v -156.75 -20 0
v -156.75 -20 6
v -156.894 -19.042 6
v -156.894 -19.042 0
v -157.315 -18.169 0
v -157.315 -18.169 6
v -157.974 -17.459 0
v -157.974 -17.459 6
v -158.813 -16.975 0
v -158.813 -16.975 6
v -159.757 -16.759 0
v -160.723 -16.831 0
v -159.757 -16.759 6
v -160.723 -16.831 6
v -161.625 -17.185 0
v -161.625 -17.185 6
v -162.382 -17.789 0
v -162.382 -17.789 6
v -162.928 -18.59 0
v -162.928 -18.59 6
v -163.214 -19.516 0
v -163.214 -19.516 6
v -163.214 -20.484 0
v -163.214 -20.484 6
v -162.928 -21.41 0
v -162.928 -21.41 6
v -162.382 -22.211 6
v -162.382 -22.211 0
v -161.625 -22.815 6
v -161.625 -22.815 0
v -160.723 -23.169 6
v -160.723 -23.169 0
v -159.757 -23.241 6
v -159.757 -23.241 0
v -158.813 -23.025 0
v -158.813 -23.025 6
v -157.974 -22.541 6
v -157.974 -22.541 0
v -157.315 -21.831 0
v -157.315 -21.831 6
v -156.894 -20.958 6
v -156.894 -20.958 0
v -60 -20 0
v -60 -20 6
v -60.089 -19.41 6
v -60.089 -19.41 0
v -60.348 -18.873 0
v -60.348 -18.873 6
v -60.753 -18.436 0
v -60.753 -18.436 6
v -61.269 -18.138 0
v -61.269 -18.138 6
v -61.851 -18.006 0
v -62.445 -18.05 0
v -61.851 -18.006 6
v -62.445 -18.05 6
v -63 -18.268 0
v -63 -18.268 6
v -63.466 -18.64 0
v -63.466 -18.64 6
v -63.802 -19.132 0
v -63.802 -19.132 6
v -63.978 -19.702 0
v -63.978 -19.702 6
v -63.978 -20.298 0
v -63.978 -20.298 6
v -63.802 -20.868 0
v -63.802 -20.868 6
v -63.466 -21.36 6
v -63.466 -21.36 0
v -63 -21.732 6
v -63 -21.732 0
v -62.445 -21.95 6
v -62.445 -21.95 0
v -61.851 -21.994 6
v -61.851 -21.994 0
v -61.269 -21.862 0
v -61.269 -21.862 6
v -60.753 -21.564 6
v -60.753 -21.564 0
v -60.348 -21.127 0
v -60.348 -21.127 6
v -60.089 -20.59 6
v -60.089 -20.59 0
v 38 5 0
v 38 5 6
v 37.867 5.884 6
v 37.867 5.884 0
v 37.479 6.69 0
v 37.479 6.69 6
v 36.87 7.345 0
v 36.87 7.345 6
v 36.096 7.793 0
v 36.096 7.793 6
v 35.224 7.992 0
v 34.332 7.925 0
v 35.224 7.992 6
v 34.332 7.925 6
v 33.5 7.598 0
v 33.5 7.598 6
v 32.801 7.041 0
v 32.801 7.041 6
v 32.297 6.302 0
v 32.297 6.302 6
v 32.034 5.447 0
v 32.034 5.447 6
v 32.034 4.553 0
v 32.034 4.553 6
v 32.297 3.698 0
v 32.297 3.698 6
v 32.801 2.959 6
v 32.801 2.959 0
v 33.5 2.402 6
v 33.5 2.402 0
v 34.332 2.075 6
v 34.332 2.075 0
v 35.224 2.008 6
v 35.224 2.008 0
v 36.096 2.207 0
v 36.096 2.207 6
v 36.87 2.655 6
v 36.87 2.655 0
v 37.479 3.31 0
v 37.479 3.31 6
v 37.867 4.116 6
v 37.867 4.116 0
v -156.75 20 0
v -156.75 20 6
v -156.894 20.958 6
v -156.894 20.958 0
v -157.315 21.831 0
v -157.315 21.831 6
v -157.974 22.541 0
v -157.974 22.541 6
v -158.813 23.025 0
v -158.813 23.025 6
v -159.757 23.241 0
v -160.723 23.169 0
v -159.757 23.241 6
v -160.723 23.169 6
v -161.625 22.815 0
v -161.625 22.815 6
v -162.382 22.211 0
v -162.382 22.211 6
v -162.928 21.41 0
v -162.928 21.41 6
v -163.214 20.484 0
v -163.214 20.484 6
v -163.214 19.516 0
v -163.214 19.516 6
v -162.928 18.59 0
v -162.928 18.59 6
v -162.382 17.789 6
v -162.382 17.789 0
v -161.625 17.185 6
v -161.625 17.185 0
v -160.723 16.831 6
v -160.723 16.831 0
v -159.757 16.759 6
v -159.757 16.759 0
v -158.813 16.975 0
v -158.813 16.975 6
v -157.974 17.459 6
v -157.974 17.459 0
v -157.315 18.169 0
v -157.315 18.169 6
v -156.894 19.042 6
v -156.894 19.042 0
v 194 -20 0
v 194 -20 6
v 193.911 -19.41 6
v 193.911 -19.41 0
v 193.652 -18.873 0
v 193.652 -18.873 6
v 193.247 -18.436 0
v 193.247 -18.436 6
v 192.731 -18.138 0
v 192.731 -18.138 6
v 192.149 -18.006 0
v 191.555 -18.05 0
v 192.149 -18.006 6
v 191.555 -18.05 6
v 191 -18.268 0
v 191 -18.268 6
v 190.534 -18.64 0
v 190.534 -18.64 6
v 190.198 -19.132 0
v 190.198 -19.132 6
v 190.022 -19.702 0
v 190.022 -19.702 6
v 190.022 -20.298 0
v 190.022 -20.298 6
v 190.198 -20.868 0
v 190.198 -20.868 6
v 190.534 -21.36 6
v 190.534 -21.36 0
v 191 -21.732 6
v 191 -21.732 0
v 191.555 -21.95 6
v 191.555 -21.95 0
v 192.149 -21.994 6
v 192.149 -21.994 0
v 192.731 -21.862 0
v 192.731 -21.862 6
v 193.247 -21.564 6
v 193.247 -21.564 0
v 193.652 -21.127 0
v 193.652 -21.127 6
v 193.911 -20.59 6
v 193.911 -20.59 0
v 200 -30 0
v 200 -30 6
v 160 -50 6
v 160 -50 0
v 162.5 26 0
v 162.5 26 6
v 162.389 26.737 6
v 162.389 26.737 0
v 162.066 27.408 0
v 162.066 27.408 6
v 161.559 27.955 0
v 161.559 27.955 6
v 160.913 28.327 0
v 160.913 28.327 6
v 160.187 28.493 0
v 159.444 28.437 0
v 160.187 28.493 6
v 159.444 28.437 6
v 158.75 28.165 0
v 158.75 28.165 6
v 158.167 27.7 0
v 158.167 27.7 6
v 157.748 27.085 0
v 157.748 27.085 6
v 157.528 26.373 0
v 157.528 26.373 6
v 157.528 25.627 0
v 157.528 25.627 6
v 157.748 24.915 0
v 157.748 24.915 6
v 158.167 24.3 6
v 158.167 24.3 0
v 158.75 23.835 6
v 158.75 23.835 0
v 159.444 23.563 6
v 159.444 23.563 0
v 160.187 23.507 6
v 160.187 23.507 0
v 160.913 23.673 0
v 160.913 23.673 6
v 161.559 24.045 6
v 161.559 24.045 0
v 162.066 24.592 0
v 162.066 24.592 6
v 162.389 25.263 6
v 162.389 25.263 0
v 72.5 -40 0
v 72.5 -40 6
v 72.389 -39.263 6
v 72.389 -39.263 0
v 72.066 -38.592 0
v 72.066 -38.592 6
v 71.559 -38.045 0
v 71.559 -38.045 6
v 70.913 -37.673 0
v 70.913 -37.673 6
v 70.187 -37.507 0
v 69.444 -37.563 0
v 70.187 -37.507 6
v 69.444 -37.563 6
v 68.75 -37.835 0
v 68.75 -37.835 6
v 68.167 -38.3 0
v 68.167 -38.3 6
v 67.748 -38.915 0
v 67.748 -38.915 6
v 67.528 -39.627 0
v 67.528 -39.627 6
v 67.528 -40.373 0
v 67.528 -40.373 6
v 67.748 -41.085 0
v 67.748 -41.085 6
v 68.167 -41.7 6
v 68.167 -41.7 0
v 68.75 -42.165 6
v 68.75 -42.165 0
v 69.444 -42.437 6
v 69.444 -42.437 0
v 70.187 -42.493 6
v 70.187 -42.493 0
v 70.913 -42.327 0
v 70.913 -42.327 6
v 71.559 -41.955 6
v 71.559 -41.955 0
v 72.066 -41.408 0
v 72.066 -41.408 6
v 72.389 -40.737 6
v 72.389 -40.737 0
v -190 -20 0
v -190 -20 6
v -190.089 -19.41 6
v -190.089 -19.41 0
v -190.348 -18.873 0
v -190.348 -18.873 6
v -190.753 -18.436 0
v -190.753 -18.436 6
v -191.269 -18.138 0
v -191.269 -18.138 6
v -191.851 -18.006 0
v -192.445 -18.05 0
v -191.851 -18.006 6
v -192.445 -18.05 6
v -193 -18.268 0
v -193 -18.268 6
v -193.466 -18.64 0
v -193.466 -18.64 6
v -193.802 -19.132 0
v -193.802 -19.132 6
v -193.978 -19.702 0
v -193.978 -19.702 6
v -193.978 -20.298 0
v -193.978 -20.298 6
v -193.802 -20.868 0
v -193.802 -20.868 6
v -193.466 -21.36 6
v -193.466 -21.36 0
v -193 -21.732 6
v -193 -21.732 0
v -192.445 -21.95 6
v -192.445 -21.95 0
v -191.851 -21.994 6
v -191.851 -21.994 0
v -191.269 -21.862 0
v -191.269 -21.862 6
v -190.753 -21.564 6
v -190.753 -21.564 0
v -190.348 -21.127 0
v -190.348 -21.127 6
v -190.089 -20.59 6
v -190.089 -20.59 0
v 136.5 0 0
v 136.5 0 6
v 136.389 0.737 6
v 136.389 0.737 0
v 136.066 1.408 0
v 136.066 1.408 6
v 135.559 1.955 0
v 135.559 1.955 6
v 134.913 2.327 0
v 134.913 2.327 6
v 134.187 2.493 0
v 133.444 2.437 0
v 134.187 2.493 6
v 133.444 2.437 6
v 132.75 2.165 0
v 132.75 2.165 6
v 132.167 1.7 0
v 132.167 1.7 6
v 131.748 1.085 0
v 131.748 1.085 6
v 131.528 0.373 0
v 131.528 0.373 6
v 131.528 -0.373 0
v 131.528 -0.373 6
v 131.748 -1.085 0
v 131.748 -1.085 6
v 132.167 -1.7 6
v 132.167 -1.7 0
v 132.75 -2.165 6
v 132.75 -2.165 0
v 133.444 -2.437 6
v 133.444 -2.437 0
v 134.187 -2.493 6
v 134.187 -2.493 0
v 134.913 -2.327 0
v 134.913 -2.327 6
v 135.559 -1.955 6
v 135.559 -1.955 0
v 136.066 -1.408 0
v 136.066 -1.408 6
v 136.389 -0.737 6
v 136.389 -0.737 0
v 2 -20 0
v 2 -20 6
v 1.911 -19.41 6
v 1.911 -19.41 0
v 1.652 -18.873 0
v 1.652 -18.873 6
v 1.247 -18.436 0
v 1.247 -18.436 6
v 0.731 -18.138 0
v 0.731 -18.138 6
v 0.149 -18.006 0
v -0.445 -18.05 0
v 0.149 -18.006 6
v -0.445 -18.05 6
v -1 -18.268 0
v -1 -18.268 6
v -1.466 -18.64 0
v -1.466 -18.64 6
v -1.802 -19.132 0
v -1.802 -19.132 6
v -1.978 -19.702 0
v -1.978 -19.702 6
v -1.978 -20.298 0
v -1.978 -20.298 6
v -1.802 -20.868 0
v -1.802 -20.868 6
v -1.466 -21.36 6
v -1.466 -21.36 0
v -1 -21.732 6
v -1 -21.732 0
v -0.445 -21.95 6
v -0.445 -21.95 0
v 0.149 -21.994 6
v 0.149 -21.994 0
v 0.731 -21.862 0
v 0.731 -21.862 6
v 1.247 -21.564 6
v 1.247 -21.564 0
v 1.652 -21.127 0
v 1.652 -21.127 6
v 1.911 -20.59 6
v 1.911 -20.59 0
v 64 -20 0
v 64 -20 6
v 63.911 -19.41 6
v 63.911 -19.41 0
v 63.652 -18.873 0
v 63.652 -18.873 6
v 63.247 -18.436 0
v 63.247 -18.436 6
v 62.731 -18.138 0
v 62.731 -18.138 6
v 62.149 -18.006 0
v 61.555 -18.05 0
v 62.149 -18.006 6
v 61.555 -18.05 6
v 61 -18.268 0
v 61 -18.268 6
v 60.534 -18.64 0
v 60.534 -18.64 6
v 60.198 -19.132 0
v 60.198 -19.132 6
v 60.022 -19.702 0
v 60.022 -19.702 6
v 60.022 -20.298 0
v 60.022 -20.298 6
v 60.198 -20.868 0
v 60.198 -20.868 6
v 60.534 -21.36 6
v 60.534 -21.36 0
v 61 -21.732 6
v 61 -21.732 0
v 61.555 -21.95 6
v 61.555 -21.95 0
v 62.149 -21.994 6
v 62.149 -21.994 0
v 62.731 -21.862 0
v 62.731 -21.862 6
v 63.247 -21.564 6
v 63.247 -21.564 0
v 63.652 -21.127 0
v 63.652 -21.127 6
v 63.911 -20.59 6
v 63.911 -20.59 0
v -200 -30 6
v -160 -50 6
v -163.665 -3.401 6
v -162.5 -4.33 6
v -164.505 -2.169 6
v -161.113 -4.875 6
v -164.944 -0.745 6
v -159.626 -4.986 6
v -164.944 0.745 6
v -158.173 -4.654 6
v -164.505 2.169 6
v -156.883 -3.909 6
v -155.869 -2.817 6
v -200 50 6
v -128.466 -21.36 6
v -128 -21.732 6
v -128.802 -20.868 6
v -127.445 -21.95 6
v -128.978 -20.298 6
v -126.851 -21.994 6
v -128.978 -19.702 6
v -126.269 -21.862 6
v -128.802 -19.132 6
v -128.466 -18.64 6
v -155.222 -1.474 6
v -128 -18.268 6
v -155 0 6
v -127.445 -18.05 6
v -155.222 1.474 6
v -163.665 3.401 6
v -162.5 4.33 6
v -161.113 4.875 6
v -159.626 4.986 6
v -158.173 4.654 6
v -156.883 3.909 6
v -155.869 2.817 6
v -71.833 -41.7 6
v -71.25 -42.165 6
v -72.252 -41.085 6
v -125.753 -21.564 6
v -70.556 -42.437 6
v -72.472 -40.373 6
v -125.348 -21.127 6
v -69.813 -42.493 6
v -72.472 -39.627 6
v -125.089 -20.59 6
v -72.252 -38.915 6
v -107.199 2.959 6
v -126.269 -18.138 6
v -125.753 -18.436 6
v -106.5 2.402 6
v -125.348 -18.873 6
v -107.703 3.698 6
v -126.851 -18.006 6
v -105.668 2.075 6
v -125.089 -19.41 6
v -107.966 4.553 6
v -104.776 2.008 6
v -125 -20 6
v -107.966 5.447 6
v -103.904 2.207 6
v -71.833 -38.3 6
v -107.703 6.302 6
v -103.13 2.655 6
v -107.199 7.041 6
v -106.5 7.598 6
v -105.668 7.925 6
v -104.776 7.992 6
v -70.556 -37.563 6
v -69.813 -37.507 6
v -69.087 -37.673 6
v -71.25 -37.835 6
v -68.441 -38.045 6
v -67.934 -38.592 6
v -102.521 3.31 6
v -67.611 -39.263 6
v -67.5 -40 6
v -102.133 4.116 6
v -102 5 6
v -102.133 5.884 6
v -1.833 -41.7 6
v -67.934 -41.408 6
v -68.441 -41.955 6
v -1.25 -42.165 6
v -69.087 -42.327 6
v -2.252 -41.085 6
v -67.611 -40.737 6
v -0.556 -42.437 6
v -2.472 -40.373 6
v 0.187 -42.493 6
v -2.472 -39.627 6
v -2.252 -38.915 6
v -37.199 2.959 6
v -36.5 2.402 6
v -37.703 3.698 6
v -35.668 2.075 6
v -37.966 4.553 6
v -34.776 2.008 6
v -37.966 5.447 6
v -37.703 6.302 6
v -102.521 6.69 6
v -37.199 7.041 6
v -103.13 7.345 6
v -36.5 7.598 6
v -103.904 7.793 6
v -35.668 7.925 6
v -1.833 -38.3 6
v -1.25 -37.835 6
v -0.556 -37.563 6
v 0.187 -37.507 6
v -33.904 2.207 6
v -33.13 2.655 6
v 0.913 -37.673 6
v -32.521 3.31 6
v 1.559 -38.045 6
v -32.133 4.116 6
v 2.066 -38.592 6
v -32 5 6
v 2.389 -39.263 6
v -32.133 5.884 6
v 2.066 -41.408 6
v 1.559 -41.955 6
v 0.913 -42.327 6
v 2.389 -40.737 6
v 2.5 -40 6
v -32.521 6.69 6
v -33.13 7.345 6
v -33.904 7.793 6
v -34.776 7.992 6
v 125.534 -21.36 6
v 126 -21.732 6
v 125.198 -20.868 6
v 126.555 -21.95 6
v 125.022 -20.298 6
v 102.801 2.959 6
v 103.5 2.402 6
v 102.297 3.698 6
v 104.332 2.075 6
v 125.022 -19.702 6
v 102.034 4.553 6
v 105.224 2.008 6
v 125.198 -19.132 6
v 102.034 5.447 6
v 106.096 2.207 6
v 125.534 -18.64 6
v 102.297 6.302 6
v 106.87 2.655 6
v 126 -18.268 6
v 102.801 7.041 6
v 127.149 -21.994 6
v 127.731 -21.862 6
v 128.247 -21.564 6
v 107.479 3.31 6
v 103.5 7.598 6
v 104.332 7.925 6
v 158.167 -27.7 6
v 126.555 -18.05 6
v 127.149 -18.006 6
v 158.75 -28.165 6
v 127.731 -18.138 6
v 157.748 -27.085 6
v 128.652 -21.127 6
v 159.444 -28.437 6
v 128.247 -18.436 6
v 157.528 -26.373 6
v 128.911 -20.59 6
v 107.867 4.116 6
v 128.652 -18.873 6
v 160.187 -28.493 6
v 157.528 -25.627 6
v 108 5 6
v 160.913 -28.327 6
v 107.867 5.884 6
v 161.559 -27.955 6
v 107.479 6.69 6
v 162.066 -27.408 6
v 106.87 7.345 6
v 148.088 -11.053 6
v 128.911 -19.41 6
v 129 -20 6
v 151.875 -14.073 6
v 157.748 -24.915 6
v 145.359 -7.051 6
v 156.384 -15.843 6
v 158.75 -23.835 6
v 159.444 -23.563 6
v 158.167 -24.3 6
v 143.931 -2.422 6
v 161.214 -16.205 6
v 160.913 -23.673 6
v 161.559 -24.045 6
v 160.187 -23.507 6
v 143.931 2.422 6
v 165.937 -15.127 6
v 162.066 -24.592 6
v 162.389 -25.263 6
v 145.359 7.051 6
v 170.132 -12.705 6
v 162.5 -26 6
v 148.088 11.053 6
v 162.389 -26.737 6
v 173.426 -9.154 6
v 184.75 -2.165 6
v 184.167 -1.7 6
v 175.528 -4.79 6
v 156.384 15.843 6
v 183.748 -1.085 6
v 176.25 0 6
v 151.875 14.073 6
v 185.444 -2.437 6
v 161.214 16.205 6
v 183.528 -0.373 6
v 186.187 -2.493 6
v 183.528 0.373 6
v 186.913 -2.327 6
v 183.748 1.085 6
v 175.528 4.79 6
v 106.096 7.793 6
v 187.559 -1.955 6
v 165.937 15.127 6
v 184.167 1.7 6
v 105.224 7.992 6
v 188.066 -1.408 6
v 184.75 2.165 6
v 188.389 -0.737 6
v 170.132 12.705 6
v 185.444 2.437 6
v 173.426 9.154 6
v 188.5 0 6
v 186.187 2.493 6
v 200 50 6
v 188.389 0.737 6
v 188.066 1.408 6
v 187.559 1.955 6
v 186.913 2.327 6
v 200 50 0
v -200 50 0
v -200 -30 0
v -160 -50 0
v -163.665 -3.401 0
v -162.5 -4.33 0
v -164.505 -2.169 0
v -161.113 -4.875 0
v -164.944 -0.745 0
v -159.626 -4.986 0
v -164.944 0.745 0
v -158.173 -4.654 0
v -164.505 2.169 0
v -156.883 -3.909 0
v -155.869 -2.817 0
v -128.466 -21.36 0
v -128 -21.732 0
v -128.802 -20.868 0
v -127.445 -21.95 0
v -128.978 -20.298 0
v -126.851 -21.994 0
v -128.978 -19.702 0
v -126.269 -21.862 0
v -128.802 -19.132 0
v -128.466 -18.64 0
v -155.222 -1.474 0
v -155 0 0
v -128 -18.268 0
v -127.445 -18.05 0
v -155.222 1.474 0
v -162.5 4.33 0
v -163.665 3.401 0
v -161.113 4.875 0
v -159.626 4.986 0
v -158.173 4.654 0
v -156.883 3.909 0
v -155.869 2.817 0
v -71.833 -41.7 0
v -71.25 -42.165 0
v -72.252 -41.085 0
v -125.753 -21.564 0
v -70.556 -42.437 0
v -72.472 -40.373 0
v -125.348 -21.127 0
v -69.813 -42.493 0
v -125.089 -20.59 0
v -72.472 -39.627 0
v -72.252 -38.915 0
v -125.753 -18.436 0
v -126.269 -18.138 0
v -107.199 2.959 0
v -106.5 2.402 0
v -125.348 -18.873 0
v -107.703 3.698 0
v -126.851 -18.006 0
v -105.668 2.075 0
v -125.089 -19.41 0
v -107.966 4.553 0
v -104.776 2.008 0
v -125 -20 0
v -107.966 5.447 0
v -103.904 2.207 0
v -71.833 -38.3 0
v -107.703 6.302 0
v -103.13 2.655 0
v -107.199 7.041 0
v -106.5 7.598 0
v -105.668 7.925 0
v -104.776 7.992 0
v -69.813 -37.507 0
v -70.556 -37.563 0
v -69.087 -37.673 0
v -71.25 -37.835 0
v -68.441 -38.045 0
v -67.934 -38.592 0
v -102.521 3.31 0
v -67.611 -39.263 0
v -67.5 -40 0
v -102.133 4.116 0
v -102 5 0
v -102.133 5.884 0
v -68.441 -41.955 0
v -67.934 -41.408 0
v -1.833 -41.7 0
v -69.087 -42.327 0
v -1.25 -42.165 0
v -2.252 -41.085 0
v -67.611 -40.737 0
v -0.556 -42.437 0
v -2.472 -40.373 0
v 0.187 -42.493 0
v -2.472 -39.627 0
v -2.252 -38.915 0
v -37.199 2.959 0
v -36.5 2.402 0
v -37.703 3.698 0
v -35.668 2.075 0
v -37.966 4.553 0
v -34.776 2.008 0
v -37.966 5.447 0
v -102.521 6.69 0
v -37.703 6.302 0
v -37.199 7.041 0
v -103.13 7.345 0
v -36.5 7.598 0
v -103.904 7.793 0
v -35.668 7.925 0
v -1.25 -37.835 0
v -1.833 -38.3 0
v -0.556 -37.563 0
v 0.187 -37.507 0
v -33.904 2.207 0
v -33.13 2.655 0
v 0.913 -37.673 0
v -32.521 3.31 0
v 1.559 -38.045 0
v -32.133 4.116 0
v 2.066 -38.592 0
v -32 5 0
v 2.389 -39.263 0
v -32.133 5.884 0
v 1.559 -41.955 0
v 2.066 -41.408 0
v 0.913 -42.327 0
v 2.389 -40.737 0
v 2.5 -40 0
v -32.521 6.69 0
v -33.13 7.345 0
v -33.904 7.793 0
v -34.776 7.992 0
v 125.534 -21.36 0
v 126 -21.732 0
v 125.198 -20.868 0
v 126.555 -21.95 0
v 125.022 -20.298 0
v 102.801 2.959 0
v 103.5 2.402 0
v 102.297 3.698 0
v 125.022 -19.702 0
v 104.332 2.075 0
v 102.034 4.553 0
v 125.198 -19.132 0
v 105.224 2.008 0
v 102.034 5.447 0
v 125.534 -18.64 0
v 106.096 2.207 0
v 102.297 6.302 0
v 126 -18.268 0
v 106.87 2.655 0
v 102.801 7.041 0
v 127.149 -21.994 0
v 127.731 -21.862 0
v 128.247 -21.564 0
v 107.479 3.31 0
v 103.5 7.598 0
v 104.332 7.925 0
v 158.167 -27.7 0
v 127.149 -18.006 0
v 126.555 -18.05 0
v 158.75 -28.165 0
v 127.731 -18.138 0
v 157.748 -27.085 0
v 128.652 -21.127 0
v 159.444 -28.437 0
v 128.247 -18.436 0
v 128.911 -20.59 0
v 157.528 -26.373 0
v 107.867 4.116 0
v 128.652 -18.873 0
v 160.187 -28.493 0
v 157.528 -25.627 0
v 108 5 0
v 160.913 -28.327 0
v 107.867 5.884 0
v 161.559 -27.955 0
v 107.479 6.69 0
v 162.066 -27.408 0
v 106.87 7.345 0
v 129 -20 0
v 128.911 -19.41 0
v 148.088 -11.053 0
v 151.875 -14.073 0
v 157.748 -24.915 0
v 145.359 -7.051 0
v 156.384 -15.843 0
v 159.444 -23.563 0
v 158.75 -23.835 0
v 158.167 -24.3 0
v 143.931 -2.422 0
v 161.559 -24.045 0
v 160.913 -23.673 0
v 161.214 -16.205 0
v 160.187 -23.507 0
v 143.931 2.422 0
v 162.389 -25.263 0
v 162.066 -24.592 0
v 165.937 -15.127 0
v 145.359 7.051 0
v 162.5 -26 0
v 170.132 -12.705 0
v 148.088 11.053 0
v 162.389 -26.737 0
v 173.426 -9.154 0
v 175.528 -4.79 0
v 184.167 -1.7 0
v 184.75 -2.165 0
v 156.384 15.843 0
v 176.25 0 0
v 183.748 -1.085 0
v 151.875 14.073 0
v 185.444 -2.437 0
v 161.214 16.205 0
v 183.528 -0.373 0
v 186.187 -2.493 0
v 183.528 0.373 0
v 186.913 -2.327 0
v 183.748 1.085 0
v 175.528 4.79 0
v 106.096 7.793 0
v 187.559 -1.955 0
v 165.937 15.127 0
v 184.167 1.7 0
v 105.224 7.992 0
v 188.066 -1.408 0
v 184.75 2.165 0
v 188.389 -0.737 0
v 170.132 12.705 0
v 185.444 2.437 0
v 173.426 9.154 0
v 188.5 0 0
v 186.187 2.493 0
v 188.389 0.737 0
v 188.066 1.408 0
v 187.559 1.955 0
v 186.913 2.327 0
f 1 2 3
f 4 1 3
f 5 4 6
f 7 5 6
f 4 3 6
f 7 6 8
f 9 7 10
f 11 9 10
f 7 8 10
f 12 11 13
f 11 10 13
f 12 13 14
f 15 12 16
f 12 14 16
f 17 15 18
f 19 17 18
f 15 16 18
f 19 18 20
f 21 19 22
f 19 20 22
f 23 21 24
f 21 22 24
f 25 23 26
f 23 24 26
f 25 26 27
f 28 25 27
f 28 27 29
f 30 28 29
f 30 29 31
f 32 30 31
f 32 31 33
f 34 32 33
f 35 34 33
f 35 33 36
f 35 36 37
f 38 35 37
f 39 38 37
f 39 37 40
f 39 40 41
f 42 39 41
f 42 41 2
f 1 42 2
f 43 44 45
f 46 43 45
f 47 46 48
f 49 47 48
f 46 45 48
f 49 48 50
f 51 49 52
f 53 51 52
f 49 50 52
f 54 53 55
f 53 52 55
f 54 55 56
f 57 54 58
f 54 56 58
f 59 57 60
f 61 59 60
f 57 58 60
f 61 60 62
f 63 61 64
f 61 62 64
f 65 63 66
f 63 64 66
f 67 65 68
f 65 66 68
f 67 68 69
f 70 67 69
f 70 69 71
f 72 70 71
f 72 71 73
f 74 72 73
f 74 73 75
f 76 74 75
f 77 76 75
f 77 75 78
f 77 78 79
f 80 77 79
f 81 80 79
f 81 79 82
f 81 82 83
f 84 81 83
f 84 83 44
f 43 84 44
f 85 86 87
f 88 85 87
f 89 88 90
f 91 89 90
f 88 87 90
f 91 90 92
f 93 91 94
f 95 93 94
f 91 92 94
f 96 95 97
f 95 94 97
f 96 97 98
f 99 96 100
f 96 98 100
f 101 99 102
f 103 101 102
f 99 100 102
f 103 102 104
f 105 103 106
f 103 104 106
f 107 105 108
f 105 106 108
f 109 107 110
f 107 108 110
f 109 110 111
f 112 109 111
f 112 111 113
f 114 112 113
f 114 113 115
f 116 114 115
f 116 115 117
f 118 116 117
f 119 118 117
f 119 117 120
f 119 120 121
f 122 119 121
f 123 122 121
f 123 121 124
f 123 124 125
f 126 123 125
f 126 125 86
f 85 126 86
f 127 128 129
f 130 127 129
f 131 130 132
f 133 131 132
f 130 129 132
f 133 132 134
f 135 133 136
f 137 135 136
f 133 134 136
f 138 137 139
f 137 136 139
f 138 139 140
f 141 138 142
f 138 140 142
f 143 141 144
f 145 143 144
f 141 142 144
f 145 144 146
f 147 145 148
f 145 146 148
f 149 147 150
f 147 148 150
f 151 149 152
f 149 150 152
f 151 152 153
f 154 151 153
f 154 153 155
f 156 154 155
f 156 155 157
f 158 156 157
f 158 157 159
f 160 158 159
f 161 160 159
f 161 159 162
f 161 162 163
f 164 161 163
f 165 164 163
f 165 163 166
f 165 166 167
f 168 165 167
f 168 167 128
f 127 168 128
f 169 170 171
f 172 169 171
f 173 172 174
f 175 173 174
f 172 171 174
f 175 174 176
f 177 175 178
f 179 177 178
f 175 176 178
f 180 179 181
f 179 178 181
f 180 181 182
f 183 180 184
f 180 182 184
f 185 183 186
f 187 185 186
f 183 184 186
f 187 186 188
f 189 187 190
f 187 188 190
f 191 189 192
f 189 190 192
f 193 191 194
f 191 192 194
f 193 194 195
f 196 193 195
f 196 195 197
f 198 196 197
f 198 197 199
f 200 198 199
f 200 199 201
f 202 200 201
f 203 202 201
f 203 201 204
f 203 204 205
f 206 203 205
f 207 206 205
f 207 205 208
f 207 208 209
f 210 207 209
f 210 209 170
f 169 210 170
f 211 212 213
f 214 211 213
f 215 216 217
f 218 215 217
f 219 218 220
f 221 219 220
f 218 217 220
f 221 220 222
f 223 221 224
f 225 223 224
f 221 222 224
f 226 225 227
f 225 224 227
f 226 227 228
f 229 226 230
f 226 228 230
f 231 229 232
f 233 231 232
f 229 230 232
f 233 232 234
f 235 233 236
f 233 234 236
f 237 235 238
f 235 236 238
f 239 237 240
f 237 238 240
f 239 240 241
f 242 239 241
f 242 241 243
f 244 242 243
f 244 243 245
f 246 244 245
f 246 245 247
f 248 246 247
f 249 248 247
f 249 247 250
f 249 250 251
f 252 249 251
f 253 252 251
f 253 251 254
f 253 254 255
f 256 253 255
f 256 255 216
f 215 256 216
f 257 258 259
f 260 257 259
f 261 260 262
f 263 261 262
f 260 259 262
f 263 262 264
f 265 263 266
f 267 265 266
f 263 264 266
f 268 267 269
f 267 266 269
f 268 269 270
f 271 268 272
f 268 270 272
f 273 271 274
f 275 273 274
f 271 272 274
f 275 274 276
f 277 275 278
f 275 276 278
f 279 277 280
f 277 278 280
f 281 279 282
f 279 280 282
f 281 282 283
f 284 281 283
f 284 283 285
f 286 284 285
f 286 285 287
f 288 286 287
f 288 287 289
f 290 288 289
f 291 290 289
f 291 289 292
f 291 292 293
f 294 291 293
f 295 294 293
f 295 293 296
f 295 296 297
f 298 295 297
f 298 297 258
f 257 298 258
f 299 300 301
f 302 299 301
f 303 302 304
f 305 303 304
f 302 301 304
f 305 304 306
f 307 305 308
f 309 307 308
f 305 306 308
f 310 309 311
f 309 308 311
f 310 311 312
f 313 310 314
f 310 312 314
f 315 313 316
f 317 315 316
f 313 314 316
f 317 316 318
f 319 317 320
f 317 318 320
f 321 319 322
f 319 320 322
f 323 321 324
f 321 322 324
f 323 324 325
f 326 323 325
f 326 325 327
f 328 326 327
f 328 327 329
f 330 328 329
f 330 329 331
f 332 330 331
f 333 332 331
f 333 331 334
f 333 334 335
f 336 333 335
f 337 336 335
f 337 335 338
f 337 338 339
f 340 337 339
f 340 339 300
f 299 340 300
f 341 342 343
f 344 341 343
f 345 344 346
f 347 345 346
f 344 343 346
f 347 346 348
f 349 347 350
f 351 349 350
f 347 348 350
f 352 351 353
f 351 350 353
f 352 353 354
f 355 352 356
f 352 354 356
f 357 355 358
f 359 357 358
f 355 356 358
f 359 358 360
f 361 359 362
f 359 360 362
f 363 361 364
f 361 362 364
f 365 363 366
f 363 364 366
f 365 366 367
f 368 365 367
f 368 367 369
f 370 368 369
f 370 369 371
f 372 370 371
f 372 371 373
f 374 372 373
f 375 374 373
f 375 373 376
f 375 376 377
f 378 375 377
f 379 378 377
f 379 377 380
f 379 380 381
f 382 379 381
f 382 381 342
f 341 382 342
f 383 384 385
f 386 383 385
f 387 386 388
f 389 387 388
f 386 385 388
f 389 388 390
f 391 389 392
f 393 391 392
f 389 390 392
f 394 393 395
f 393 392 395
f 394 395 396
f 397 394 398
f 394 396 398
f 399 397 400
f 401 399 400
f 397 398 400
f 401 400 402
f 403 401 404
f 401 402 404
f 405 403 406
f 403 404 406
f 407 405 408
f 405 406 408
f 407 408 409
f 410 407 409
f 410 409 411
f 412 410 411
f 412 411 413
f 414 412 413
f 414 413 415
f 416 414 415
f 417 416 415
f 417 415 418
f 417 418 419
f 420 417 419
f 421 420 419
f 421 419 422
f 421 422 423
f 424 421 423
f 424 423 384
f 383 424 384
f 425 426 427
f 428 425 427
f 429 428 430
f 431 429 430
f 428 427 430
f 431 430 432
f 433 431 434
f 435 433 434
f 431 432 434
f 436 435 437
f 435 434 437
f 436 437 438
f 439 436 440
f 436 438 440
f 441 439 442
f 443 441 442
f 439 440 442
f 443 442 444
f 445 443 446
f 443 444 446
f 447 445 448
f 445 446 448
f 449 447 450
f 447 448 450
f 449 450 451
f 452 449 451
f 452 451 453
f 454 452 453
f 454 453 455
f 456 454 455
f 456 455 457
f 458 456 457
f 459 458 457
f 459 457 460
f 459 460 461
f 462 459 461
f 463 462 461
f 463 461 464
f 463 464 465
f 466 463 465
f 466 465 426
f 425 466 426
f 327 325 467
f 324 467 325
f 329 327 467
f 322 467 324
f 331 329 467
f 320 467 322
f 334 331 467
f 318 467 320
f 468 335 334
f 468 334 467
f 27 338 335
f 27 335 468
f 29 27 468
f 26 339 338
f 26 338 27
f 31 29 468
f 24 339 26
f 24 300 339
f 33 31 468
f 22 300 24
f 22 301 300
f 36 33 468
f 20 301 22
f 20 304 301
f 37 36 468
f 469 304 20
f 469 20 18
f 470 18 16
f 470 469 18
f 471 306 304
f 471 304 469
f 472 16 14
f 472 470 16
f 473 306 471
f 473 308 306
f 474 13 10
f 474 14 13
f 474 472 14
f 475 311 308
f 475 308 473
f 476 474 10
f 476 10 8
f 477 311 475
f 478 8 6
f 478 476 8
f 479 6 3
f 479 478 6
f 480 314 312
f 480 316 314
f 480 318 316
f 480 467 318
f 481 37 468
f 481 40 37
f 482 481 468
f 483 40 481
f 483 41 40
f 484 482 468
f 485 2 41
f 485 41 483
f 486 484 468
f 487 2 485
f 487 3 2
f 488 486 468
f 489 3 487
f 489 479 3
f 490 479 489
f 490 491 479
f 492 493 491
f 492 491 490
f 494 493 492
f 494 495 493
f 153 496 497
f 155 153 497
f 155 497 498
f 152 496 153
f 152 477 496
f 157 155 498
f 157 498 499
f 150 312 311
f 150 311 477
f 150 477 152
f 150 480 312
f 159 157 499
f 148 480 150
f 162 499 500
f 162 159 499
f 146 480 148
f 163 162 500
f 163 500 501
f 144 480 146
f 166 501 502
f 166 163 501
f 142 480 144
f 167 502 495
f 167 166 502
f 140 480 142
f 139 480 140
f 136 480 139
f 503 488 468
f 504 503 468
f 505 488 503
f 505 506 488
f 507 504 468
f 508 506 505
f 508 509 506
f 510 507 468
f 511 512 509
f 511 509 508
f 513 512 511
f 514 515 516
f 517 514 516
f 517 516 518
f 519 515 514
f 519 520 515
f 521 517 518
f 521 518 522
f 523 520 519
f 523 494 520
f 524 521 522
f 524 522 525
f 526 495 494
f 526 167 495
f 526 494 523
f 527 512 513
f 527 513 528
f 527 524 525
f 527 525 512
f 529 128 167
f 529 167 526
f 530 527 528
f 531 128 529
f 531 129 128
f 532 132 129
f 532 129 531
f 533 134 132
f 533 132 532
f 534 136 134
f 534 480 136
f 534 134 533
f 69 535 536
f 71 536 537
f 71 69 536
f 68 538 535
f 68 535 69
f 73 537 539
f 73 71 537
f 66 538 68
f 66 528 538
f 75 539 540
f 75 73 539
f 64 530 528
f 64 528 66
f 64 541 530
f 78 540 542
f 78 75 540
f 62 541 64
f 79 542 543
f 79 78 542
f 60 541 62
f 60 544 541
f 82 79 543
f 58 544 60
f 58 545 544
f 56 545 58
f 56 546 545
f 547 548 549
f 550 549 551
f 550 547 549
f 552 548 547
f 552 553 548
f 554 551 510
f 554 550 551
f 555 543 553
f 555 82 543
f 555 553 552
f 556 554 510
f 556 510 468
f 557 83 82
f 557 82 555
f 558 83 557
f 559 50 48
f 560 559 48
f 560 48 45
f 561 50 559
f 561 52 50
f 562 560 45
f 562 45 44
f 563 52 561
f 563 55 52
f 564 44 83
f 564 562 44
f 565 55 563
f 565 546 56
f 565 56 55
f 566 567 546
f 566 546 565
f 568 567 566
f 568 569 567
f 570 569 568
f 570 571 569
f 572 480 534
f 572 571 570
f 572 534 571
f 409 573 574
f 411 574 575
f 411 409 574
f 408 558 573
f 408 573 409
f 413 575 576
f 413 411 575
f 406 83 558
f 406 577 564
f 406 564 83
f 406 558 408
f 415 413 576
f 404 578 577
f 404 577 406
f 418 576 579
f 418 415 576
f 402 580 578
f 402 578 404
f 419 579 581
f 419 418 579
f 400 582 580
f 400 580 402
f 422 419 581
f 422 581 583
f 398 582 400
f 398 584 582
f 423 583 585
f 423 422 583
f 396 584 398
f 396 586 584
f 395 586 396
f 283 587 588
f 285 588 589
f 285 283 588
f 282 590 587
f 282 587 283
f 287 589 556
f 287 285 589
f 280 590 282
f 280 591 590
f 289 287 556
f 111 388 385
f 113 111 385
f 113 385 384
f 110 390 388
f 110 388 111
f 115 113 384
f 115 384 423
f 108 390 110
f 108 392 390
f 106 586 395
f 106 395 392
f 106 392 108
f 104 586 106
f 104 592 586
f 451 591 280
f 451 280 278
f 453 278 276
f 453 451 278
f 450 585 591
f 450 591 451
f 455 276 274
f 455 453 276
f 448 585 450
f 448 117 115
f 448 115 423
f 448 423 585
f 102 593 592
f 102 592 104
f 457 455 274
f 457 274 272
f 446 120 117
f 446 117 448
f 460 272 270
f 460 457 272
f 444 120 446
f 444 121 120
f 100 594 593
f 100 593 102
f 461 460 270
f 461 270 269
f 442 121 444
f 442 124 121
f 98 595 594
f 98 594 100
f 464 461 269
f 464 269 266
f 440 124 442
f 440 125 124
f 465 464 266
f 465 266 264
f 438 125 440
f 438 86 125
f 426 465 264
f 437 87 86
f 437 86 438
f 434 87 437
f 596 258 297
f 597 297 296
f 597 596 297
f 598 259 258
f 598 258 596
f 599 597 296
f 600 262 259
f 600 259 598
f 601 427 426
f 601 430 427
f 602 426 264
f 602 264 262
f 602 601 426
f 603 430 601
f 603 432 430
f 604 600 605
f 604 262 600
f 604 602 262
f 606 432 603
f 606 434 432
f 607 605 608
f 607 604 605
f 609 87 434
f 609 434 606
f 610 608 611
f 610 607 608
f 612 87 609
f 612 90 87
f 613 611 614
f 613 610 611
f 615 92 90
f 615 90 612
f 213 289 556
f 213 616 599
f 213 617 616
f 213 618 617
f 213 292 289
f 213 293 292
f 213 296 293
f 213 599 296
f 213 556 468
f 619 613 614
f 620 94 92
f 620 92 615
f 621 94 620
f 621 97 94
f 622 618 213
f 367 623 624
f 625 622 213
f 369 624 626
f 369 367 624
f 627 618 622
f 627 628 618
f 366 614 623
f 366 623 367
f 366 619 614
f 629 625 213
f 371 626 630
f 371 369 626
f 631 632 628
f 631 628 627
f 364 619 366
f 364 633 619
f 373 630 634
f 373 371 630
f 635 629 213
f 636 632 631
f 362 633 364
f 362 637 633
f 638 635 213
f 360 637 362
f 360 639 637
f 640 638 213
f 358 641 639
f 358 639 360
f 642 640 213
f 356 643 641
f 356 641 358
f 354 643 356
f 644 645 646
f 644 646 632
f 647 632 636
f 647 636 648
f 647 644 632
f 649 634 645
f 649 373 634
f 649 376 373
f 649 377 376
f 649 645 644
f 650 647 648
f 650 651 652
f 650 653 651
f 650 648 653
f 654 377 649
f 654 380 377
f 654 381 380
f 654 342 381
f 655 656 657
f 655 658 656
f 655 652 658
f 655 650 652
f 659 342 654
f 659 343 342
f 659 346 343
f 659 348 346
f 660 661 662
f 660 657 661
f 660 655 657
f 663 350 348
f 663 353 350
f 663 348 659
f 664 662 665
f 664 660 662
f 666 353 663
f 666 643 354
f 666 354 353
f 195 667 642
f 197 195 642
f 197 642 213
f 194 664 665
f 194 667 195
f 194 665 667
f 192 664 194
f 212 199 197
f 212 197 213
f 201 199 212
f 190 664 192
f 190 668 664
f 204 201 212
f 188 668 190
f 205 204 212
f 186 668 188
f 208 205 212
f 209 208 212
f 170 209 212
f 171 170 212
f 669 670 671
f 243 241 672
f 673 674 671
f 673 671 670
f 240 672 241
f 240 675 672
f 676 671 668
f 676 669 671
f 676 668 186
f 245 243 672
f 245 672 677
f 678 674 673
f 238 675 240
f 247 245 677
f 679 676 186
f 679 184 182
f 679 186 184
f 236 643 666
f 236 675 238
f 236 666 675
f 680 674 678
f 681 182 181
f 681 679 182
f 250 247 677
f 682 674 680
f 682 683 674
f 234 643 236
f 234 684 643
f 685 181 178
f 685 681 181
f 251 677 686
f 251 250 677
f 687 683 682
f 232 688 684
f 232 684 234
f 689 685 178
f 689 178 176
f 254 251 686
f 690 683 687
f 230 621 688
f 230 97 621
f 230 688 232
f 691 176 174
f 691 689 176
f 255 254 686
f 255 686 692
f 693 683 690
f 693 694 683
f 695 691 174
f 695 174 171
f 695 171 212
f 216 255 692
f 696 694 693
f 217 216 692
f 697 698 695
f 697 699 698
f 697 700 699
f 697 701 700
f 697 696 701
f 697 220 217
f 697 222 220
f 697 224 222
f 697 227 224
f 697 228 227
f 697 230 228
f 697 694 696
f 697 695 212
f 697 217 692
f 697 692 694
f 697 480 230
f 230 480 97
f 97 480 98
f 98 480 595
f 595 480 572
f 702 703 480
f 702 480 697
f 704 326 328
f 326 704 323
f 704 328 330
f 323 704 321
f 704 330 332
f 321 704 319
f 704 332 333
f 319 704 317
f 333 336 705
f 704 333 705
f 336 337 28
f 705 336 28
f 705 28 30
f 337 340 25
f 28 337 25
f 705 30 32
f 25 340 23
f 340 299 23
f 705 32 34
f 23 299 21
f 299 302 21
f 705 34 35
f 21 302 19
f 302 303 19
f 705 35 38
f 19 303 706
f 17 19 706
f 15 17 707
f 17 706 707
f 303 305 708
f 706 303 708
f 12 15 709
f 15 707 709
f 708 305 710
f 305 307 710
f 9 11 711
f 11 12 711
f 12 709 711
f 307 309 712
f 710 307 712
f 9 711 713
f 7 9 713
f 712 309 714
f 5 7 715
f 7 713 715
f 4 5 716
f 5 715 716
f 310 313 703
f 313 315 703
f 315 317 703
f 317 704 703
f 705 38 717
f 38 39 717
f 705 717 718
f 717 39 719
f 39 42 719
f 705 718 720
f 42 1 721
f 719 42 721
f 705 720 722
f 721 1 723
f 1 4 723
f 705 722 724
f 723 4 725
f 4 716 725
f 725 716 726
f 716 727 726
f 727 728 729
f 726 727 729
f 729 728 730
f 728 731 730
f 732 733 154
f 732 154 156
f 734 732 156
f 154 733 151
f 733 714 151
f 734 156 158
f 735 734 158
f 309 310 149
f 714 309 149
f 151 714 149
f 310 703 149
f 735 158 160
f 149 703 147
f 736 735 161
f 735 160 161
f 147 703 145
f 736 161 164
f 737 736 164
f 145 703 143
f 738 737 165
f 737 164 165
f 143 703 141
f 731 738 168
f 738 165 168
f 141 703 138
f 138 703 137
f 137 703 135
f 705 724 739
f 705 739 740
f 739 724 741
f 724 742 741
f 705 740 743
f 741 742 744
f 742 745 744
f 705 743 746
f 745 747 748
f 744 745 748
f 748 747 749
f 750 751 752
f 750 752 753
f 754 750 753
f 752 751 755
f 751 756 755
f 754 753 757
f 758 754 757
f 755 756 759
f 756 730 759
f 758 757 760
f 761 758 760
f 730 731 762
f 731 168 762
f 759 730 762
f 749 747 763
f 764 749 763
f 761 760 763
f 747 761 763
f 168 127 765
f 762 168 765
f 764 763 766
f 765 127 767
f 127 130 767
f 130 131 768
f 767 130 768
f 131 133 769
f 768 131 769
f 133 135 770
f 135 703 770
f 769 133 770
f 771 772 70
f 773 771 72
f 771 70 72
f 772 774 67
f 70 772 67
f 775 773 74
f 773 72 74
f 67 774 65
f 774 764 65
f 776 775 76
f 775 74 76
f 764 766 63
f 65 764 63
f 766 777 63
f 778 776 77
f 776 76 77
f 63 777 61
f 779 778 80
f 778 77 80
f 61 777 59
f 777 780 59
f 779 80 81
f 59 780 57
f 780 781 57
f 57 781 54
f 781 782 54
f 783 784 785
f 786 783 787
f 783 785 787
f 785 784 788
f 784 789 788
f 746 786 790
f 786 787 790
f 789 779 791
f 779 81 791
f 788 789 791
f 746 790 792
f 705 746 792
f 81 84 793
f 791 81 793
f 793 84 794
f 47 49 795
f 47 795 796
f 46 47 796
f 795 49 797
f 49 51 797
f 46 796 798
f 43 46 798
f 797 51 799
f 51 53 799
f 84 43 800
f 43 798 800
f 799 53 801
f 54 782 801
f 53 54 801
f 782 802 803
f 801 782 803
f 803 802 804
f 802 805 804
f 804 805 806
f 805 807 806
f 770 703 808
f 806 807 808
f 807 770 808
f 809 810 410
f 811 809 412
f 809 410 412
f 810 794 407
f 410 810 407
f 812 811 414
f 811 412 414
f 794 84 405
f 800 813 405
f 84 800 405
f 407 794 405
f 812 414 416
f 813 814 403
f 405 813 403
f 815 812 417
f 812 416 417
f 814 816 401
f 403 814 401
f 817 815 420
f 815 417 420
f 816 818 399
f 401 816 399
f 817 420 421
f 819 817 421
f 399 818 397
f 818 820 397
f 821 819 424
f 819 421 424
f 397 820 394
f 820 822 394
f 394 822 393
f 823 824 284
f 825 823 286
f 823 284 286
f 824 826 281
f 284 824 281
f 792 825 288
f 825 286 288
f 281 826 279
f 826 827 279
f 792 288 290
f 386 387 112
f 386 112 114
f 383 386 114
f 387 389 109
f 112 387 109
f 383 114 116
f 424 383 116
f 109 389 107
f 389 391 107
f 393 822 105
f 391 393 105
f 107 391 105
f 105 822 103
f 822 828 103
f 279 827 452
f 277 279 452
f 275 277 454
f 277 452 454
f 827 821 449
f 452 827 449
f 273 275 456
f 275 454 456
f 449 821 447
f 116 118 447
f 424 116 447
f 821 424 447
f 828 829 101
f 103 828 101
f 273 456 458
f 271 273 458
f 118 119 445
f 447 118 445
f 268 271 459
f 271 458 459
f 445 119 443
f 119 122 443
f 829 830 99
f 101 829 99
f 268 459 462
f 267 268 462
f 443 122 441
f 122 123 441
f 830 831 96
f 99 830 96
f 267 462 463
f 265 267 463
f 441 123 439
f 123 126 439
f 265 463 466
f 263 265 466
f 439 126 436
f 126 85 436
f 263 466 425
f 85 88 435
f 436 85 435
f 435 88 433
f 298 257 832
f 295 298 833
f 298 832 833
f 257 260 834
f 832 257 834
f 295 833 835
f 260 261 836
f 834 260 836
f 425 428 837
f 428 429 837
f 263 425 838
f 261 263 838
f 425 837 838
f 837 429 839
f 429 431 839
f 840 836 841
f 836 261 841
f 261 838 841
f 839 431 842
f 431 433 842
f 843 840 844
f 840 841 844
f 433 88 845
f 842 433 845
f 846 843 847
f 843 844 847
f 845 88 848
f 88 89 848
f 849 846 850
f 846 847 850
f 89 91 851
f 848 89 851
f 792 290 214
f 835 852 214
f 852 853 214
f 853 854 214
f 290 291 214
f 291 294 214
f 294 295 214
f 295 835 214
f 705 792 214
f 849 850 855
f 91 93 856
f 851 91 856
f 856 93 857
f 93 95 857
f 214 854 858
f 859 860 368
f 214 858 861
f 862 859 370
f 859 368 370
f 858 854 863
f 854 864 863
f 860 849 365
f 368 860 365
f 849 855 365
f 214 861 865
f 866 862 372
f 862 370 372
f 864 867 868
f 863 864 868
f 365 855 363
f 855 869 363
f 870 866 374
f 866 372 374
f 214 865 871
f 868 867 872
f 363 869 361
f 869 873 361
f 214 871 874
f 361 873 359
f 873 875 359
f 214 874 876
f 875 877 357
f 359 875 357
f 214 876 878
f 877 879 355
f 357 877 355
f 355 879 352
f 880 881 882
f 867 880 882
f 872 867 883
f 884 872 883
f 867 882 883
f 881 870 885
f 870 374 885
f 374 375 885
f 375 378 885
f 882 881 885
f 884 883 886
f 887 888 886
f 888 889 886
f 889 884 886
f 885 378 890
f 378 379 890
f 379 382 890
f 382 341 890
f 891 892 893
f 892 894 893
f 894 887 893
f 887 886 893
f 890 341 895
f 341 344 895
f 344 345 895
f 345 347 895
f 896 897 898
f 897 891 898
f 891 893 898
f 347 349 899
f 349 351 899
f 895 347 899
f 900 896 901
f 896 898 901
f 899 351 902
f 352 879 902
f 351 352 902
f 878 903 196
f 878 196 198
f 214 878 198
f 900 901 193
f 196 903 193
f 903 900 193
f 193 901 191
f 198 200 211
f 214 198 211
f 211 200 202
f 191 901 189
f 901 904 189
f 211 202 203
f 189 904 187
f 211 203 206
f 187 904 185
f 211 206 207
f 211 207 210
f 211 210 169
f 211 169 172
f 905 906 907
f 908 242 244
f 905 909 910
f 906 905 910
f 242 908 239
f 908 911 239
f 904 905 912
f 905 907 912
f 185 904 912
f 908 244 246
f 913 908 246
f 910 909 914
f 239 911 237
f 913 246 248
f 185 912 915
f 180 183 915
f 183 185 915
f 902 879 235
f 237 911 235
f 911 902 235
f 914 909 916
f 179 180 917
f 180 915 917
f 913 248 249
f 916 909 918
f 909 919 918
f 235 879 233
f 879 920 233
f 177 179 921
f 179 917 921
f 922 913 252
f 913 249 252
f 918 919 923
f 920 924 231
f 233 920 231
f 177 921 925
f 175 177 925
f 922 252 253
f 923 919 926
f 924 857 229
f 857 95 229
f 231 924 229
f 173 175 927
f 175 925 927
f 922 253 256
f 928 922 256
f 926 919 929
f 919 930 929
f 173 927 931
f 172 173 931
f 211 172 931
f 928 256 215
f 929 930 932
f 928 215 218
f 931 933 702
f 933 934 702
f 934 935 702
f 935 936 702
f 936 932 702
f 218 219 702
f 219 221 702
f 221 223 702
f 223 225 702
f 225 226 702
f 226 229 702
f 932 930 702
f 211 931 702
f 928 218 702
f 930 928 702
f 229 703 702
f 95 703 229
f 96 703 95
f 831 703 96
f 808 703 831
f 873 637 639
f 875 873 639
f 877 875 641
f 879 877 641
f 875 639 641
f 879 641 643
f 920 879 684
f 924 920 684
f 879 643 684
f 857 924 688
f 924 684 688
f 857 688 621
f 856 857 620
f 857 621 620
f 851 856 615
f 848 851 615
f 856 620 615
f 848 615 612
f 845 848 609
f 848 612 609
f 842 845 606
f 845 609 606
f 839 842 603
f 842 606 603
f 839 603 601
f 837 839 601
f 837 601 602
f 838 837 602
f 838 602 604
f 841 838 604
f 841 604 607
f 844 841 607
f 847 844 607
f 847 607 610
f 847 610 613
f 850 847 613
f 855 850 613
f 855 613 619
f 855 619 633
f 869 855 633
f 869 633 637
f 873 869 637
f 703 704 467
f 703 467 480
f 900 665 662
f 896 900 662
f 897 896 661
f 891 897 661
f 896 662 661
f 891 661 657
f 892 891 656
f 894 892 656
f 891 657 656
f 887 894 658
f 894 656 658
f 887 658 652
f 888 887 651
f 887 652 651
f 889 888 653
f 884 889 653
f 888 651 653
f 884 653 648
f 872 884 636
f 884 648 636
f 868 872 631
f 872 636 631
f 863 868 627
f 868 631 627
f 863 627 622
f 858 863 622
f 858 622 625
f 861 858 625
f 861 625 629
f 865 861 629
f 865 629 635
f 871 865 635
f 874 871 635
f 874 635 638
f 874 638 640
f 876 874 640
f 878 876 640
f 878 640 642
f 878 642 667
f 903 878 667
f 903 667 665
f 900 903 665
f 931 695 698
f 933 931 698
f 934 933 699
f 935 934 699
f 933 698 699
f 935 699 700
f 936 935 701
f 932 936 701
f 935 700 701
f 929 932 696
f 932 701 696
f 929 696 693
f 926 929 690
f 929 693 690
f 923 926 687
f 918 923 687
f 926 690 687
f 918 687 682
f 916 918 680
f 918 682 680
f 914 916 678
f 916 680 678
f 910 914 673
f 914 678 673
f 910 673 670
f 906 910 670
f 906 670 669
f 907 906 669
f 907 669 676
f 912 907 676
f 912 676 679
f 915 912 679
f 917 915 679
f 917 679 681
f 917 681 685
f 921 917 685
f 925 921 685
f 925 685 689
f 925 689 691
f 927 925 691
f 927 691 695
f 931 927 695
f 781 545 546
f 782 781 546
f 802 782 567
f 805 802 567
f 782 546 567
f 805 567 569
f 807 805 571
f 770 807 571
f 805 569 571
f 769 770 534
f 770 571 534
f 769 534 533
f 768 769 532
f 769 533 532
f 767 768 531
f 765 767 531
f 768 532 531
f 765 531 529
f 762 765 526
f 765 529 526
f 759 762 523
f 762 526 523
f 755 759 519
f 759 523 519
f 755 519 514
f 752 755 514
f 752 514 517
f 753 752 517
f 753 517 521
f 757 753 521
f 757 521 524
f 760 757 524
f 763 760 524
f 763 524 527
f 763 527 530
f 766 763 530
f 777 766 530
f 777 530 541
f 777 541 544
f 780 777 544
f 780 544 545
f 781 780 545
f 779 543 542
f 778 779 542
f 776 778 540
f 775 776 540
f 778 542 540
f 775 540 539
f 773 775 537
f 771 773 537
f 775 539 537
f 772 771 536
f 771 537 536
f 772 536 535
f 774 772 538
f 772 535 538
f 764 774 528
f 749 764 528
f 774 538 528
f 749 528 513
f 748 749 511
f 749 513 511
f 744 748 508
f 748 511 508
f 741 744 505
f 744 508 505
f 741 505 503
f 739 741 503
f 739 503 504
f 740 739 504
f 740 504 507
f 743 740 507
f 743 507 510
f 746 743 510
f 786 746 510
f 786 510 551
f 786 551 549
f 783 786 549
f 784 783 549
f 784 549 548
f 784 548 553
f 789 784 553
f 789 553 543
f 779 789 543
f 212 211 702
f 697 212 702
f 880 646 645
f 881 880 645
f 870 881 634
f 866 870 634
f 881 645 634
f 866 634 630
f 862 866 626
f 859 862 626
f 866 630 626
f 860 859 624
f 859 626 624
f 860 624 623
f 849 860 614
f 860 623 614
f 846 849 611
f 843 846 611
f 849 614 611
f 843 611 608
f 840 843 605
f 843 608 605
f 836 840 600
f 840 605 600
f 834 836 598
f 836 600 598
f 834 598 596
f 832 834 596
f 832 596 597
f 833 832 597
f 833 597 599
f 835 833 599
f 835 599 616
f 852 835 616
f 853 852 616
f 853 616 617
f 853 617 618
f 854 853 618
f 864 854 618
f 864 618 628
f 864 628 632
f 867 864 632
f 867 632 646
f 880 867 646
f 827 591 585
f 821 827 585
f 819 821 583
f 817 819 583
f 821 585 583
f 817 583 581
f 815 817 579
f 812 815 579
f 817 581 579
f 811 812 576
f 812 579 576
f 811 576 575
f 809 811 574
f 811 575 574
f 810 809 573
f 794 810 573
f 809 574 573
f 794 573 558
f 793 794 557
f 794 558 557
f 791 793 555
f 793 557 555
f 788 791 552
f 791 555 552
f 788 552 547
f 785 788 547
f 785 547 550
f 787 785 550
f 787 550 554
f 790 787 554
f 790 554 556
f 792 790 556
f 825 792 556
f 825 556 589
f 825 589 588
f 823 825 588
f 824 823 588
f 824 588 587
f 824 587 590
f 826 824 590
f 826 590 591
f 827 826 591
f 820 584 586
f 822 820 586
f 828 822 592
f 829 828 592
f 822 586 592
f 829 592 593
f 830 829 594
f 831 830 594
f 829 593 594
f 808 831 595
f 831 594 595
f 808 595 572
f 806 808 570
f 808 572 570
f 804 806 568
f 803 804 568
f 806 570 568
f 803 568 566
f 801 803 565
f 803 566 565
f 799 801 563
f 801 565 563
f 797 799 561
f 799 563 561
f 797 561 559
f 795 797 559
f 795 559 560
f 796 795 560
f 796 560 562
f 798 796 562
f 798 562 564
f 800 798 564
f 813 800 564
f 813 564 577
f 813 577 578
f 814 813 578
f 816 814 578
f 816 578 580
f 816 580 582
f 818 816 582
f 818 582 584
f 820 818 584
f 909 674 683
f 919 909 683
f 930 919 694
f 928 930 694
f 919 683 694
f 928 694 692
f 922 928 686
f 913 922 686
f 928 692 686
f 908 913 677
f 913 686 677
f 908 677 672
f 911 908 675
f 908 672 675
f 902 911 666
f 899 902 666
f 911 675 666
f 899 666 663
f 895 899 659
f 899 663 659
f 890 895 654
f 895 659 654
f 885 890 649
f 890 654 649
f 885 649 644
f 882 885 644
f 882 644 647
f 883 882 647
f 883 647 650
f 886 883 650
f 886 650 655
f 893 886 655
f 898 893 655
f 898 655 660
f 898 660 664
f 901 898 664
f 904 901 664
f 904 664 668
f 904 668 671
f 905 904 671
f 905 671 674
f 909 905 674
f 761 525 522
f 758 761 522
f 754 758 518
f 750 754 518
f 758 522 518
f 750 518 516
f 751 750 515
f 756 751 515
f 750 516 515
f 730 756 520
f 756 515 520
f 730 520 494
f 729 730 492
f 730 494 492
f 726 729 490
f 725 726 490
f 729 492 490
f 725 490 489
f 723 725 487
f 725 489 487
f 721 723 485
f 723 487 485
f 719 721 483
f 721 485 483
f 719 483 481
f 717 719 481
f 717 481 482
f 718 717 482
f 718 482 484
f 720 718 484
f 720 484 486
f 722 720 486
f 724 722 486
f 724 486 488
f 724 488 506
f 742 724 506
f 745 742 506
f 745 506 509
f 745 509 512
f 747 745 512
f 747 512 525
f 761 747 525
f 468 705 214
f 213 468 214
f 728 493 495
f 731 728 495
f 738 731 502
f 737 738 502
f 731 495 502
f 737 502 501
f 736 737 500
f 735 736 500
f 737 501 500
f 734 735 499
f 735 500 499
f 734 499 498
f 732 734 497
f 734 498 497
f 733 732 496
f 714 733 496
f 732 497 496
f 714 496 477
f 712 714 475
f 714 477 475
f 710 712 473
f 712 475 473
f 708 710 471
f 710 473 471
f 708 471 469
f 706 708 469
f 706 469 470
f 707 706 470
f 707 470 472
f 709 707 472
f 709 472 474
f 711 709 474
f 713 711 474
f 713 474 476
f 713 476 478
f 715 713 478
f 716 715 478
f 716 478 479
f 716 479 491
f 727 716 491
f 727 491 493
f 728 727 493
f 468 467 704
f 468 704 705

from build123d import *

# Parameters (mm, degrees)
SKETCH_1_W          = 400
SKETCH_1_H          = 100
EXTRUDE_1_DEPTH     = 6
SKETCH_2_R          = 5
SKETCH_2_R_2        = 3.25
SKETCH_2_R_3        = 16.25
SKETCH_2_R_4        = 2.5
CUT_EXTRUDE_2_DEPTH = 207.242575624
SKETCH_3_R          = 3
SKETCH_3_R_2        = 2
SKETCH_3_R_3        = 2.5
CUT_EXTRUDE_3_DEPTH = 207.242575624


with BuildPart() as part:
    # 草圖1 → 伸長1 (new body)
    with BuildSketch(Plane.XY):
        Rectangle(SKETCH_1_W, SKETCH_1_H)
    extrude(amount=EXTRUDE_1_DEPTH)

    # 草圖2 → 伸長2 (cut, through all)
    with BuildSketch(Plane.XY.offset(6)):
        with Locations((-160, 0)):
            Circle(SKETCH_2_R)
        with Locations((-160, 20)):
            Circle(SKETCH_2_R_2)
        with Locations((-160, -20)):
            Circle(SKETCH_2_R_2)
        with Locations((160, 0)):
            Circle(SKETCH_2_R_3)
        with Locations((160, 26)):
            Circle(SKETCH_2_R_4)
        with Locations((134, 0)):
            Circle(SKETCH_2_R_4)
        with Locations((186, 0)):
            Circle(SKETCH_2_R_4)
        with Locations((160, -26)):
            Circle(SKETCH_2_R_4)
        Polygon((-200, -30), (-160, -50), (-200, -50), align=None)
        Polygon((200, -50), (200, -30), (160, -50), align=None)
    extrude(amount=-CUT_EXTRUDE_2_DEPTH, mode=Mode.SUBTRACT)

    # 草圖3 → 伸長3 (cut, through all)
    with BuildSketch(Plane.XY.offset(6)):
        with Locations((-105, 5)):
            Circle(SKETCH_3_R)
        with Locations((-35, 5)):
            Circle(SKETCH_3_R)
        with Locations((35, 5)):
            Circle(SKETCH_3_R)
        with Locations((105, 5)):
            Circle(SKETCH_3_R)
        with Locations((-62, -20)):
            Circle(SKETCH_3_R_2)
        with Locations((0, -20)):
            Circle(SKETCH_3_R_2)
        with Locations((62, -20)):
            Circle(SKETCH_3_R_2)
        with Locations((-192, -20)):
            Circle(SKETCH_3_R_2)
        with Locations((127, -20)):
            Circle(SKETCH_3_R_2)
        with Locations((-127, -20)):
            Circle(SKETCH_3_R_2)
        with Locations((192, -20)):
            Circle(SKETCH_3_R_2)
        with Locations((-70, -40)):
            Circle(SKETCH_3_R_3)
        with Locations((0, -40)):
            Circle(SKETCH_3_R_3)
        with Locations((70, -40)):
            Circle(SKETCH_3_R_3)
    extrude(amount=-CUT_EXTRUDE_3_DEPTH, mode=Mode.SUBTRACT)


solid = part.part
